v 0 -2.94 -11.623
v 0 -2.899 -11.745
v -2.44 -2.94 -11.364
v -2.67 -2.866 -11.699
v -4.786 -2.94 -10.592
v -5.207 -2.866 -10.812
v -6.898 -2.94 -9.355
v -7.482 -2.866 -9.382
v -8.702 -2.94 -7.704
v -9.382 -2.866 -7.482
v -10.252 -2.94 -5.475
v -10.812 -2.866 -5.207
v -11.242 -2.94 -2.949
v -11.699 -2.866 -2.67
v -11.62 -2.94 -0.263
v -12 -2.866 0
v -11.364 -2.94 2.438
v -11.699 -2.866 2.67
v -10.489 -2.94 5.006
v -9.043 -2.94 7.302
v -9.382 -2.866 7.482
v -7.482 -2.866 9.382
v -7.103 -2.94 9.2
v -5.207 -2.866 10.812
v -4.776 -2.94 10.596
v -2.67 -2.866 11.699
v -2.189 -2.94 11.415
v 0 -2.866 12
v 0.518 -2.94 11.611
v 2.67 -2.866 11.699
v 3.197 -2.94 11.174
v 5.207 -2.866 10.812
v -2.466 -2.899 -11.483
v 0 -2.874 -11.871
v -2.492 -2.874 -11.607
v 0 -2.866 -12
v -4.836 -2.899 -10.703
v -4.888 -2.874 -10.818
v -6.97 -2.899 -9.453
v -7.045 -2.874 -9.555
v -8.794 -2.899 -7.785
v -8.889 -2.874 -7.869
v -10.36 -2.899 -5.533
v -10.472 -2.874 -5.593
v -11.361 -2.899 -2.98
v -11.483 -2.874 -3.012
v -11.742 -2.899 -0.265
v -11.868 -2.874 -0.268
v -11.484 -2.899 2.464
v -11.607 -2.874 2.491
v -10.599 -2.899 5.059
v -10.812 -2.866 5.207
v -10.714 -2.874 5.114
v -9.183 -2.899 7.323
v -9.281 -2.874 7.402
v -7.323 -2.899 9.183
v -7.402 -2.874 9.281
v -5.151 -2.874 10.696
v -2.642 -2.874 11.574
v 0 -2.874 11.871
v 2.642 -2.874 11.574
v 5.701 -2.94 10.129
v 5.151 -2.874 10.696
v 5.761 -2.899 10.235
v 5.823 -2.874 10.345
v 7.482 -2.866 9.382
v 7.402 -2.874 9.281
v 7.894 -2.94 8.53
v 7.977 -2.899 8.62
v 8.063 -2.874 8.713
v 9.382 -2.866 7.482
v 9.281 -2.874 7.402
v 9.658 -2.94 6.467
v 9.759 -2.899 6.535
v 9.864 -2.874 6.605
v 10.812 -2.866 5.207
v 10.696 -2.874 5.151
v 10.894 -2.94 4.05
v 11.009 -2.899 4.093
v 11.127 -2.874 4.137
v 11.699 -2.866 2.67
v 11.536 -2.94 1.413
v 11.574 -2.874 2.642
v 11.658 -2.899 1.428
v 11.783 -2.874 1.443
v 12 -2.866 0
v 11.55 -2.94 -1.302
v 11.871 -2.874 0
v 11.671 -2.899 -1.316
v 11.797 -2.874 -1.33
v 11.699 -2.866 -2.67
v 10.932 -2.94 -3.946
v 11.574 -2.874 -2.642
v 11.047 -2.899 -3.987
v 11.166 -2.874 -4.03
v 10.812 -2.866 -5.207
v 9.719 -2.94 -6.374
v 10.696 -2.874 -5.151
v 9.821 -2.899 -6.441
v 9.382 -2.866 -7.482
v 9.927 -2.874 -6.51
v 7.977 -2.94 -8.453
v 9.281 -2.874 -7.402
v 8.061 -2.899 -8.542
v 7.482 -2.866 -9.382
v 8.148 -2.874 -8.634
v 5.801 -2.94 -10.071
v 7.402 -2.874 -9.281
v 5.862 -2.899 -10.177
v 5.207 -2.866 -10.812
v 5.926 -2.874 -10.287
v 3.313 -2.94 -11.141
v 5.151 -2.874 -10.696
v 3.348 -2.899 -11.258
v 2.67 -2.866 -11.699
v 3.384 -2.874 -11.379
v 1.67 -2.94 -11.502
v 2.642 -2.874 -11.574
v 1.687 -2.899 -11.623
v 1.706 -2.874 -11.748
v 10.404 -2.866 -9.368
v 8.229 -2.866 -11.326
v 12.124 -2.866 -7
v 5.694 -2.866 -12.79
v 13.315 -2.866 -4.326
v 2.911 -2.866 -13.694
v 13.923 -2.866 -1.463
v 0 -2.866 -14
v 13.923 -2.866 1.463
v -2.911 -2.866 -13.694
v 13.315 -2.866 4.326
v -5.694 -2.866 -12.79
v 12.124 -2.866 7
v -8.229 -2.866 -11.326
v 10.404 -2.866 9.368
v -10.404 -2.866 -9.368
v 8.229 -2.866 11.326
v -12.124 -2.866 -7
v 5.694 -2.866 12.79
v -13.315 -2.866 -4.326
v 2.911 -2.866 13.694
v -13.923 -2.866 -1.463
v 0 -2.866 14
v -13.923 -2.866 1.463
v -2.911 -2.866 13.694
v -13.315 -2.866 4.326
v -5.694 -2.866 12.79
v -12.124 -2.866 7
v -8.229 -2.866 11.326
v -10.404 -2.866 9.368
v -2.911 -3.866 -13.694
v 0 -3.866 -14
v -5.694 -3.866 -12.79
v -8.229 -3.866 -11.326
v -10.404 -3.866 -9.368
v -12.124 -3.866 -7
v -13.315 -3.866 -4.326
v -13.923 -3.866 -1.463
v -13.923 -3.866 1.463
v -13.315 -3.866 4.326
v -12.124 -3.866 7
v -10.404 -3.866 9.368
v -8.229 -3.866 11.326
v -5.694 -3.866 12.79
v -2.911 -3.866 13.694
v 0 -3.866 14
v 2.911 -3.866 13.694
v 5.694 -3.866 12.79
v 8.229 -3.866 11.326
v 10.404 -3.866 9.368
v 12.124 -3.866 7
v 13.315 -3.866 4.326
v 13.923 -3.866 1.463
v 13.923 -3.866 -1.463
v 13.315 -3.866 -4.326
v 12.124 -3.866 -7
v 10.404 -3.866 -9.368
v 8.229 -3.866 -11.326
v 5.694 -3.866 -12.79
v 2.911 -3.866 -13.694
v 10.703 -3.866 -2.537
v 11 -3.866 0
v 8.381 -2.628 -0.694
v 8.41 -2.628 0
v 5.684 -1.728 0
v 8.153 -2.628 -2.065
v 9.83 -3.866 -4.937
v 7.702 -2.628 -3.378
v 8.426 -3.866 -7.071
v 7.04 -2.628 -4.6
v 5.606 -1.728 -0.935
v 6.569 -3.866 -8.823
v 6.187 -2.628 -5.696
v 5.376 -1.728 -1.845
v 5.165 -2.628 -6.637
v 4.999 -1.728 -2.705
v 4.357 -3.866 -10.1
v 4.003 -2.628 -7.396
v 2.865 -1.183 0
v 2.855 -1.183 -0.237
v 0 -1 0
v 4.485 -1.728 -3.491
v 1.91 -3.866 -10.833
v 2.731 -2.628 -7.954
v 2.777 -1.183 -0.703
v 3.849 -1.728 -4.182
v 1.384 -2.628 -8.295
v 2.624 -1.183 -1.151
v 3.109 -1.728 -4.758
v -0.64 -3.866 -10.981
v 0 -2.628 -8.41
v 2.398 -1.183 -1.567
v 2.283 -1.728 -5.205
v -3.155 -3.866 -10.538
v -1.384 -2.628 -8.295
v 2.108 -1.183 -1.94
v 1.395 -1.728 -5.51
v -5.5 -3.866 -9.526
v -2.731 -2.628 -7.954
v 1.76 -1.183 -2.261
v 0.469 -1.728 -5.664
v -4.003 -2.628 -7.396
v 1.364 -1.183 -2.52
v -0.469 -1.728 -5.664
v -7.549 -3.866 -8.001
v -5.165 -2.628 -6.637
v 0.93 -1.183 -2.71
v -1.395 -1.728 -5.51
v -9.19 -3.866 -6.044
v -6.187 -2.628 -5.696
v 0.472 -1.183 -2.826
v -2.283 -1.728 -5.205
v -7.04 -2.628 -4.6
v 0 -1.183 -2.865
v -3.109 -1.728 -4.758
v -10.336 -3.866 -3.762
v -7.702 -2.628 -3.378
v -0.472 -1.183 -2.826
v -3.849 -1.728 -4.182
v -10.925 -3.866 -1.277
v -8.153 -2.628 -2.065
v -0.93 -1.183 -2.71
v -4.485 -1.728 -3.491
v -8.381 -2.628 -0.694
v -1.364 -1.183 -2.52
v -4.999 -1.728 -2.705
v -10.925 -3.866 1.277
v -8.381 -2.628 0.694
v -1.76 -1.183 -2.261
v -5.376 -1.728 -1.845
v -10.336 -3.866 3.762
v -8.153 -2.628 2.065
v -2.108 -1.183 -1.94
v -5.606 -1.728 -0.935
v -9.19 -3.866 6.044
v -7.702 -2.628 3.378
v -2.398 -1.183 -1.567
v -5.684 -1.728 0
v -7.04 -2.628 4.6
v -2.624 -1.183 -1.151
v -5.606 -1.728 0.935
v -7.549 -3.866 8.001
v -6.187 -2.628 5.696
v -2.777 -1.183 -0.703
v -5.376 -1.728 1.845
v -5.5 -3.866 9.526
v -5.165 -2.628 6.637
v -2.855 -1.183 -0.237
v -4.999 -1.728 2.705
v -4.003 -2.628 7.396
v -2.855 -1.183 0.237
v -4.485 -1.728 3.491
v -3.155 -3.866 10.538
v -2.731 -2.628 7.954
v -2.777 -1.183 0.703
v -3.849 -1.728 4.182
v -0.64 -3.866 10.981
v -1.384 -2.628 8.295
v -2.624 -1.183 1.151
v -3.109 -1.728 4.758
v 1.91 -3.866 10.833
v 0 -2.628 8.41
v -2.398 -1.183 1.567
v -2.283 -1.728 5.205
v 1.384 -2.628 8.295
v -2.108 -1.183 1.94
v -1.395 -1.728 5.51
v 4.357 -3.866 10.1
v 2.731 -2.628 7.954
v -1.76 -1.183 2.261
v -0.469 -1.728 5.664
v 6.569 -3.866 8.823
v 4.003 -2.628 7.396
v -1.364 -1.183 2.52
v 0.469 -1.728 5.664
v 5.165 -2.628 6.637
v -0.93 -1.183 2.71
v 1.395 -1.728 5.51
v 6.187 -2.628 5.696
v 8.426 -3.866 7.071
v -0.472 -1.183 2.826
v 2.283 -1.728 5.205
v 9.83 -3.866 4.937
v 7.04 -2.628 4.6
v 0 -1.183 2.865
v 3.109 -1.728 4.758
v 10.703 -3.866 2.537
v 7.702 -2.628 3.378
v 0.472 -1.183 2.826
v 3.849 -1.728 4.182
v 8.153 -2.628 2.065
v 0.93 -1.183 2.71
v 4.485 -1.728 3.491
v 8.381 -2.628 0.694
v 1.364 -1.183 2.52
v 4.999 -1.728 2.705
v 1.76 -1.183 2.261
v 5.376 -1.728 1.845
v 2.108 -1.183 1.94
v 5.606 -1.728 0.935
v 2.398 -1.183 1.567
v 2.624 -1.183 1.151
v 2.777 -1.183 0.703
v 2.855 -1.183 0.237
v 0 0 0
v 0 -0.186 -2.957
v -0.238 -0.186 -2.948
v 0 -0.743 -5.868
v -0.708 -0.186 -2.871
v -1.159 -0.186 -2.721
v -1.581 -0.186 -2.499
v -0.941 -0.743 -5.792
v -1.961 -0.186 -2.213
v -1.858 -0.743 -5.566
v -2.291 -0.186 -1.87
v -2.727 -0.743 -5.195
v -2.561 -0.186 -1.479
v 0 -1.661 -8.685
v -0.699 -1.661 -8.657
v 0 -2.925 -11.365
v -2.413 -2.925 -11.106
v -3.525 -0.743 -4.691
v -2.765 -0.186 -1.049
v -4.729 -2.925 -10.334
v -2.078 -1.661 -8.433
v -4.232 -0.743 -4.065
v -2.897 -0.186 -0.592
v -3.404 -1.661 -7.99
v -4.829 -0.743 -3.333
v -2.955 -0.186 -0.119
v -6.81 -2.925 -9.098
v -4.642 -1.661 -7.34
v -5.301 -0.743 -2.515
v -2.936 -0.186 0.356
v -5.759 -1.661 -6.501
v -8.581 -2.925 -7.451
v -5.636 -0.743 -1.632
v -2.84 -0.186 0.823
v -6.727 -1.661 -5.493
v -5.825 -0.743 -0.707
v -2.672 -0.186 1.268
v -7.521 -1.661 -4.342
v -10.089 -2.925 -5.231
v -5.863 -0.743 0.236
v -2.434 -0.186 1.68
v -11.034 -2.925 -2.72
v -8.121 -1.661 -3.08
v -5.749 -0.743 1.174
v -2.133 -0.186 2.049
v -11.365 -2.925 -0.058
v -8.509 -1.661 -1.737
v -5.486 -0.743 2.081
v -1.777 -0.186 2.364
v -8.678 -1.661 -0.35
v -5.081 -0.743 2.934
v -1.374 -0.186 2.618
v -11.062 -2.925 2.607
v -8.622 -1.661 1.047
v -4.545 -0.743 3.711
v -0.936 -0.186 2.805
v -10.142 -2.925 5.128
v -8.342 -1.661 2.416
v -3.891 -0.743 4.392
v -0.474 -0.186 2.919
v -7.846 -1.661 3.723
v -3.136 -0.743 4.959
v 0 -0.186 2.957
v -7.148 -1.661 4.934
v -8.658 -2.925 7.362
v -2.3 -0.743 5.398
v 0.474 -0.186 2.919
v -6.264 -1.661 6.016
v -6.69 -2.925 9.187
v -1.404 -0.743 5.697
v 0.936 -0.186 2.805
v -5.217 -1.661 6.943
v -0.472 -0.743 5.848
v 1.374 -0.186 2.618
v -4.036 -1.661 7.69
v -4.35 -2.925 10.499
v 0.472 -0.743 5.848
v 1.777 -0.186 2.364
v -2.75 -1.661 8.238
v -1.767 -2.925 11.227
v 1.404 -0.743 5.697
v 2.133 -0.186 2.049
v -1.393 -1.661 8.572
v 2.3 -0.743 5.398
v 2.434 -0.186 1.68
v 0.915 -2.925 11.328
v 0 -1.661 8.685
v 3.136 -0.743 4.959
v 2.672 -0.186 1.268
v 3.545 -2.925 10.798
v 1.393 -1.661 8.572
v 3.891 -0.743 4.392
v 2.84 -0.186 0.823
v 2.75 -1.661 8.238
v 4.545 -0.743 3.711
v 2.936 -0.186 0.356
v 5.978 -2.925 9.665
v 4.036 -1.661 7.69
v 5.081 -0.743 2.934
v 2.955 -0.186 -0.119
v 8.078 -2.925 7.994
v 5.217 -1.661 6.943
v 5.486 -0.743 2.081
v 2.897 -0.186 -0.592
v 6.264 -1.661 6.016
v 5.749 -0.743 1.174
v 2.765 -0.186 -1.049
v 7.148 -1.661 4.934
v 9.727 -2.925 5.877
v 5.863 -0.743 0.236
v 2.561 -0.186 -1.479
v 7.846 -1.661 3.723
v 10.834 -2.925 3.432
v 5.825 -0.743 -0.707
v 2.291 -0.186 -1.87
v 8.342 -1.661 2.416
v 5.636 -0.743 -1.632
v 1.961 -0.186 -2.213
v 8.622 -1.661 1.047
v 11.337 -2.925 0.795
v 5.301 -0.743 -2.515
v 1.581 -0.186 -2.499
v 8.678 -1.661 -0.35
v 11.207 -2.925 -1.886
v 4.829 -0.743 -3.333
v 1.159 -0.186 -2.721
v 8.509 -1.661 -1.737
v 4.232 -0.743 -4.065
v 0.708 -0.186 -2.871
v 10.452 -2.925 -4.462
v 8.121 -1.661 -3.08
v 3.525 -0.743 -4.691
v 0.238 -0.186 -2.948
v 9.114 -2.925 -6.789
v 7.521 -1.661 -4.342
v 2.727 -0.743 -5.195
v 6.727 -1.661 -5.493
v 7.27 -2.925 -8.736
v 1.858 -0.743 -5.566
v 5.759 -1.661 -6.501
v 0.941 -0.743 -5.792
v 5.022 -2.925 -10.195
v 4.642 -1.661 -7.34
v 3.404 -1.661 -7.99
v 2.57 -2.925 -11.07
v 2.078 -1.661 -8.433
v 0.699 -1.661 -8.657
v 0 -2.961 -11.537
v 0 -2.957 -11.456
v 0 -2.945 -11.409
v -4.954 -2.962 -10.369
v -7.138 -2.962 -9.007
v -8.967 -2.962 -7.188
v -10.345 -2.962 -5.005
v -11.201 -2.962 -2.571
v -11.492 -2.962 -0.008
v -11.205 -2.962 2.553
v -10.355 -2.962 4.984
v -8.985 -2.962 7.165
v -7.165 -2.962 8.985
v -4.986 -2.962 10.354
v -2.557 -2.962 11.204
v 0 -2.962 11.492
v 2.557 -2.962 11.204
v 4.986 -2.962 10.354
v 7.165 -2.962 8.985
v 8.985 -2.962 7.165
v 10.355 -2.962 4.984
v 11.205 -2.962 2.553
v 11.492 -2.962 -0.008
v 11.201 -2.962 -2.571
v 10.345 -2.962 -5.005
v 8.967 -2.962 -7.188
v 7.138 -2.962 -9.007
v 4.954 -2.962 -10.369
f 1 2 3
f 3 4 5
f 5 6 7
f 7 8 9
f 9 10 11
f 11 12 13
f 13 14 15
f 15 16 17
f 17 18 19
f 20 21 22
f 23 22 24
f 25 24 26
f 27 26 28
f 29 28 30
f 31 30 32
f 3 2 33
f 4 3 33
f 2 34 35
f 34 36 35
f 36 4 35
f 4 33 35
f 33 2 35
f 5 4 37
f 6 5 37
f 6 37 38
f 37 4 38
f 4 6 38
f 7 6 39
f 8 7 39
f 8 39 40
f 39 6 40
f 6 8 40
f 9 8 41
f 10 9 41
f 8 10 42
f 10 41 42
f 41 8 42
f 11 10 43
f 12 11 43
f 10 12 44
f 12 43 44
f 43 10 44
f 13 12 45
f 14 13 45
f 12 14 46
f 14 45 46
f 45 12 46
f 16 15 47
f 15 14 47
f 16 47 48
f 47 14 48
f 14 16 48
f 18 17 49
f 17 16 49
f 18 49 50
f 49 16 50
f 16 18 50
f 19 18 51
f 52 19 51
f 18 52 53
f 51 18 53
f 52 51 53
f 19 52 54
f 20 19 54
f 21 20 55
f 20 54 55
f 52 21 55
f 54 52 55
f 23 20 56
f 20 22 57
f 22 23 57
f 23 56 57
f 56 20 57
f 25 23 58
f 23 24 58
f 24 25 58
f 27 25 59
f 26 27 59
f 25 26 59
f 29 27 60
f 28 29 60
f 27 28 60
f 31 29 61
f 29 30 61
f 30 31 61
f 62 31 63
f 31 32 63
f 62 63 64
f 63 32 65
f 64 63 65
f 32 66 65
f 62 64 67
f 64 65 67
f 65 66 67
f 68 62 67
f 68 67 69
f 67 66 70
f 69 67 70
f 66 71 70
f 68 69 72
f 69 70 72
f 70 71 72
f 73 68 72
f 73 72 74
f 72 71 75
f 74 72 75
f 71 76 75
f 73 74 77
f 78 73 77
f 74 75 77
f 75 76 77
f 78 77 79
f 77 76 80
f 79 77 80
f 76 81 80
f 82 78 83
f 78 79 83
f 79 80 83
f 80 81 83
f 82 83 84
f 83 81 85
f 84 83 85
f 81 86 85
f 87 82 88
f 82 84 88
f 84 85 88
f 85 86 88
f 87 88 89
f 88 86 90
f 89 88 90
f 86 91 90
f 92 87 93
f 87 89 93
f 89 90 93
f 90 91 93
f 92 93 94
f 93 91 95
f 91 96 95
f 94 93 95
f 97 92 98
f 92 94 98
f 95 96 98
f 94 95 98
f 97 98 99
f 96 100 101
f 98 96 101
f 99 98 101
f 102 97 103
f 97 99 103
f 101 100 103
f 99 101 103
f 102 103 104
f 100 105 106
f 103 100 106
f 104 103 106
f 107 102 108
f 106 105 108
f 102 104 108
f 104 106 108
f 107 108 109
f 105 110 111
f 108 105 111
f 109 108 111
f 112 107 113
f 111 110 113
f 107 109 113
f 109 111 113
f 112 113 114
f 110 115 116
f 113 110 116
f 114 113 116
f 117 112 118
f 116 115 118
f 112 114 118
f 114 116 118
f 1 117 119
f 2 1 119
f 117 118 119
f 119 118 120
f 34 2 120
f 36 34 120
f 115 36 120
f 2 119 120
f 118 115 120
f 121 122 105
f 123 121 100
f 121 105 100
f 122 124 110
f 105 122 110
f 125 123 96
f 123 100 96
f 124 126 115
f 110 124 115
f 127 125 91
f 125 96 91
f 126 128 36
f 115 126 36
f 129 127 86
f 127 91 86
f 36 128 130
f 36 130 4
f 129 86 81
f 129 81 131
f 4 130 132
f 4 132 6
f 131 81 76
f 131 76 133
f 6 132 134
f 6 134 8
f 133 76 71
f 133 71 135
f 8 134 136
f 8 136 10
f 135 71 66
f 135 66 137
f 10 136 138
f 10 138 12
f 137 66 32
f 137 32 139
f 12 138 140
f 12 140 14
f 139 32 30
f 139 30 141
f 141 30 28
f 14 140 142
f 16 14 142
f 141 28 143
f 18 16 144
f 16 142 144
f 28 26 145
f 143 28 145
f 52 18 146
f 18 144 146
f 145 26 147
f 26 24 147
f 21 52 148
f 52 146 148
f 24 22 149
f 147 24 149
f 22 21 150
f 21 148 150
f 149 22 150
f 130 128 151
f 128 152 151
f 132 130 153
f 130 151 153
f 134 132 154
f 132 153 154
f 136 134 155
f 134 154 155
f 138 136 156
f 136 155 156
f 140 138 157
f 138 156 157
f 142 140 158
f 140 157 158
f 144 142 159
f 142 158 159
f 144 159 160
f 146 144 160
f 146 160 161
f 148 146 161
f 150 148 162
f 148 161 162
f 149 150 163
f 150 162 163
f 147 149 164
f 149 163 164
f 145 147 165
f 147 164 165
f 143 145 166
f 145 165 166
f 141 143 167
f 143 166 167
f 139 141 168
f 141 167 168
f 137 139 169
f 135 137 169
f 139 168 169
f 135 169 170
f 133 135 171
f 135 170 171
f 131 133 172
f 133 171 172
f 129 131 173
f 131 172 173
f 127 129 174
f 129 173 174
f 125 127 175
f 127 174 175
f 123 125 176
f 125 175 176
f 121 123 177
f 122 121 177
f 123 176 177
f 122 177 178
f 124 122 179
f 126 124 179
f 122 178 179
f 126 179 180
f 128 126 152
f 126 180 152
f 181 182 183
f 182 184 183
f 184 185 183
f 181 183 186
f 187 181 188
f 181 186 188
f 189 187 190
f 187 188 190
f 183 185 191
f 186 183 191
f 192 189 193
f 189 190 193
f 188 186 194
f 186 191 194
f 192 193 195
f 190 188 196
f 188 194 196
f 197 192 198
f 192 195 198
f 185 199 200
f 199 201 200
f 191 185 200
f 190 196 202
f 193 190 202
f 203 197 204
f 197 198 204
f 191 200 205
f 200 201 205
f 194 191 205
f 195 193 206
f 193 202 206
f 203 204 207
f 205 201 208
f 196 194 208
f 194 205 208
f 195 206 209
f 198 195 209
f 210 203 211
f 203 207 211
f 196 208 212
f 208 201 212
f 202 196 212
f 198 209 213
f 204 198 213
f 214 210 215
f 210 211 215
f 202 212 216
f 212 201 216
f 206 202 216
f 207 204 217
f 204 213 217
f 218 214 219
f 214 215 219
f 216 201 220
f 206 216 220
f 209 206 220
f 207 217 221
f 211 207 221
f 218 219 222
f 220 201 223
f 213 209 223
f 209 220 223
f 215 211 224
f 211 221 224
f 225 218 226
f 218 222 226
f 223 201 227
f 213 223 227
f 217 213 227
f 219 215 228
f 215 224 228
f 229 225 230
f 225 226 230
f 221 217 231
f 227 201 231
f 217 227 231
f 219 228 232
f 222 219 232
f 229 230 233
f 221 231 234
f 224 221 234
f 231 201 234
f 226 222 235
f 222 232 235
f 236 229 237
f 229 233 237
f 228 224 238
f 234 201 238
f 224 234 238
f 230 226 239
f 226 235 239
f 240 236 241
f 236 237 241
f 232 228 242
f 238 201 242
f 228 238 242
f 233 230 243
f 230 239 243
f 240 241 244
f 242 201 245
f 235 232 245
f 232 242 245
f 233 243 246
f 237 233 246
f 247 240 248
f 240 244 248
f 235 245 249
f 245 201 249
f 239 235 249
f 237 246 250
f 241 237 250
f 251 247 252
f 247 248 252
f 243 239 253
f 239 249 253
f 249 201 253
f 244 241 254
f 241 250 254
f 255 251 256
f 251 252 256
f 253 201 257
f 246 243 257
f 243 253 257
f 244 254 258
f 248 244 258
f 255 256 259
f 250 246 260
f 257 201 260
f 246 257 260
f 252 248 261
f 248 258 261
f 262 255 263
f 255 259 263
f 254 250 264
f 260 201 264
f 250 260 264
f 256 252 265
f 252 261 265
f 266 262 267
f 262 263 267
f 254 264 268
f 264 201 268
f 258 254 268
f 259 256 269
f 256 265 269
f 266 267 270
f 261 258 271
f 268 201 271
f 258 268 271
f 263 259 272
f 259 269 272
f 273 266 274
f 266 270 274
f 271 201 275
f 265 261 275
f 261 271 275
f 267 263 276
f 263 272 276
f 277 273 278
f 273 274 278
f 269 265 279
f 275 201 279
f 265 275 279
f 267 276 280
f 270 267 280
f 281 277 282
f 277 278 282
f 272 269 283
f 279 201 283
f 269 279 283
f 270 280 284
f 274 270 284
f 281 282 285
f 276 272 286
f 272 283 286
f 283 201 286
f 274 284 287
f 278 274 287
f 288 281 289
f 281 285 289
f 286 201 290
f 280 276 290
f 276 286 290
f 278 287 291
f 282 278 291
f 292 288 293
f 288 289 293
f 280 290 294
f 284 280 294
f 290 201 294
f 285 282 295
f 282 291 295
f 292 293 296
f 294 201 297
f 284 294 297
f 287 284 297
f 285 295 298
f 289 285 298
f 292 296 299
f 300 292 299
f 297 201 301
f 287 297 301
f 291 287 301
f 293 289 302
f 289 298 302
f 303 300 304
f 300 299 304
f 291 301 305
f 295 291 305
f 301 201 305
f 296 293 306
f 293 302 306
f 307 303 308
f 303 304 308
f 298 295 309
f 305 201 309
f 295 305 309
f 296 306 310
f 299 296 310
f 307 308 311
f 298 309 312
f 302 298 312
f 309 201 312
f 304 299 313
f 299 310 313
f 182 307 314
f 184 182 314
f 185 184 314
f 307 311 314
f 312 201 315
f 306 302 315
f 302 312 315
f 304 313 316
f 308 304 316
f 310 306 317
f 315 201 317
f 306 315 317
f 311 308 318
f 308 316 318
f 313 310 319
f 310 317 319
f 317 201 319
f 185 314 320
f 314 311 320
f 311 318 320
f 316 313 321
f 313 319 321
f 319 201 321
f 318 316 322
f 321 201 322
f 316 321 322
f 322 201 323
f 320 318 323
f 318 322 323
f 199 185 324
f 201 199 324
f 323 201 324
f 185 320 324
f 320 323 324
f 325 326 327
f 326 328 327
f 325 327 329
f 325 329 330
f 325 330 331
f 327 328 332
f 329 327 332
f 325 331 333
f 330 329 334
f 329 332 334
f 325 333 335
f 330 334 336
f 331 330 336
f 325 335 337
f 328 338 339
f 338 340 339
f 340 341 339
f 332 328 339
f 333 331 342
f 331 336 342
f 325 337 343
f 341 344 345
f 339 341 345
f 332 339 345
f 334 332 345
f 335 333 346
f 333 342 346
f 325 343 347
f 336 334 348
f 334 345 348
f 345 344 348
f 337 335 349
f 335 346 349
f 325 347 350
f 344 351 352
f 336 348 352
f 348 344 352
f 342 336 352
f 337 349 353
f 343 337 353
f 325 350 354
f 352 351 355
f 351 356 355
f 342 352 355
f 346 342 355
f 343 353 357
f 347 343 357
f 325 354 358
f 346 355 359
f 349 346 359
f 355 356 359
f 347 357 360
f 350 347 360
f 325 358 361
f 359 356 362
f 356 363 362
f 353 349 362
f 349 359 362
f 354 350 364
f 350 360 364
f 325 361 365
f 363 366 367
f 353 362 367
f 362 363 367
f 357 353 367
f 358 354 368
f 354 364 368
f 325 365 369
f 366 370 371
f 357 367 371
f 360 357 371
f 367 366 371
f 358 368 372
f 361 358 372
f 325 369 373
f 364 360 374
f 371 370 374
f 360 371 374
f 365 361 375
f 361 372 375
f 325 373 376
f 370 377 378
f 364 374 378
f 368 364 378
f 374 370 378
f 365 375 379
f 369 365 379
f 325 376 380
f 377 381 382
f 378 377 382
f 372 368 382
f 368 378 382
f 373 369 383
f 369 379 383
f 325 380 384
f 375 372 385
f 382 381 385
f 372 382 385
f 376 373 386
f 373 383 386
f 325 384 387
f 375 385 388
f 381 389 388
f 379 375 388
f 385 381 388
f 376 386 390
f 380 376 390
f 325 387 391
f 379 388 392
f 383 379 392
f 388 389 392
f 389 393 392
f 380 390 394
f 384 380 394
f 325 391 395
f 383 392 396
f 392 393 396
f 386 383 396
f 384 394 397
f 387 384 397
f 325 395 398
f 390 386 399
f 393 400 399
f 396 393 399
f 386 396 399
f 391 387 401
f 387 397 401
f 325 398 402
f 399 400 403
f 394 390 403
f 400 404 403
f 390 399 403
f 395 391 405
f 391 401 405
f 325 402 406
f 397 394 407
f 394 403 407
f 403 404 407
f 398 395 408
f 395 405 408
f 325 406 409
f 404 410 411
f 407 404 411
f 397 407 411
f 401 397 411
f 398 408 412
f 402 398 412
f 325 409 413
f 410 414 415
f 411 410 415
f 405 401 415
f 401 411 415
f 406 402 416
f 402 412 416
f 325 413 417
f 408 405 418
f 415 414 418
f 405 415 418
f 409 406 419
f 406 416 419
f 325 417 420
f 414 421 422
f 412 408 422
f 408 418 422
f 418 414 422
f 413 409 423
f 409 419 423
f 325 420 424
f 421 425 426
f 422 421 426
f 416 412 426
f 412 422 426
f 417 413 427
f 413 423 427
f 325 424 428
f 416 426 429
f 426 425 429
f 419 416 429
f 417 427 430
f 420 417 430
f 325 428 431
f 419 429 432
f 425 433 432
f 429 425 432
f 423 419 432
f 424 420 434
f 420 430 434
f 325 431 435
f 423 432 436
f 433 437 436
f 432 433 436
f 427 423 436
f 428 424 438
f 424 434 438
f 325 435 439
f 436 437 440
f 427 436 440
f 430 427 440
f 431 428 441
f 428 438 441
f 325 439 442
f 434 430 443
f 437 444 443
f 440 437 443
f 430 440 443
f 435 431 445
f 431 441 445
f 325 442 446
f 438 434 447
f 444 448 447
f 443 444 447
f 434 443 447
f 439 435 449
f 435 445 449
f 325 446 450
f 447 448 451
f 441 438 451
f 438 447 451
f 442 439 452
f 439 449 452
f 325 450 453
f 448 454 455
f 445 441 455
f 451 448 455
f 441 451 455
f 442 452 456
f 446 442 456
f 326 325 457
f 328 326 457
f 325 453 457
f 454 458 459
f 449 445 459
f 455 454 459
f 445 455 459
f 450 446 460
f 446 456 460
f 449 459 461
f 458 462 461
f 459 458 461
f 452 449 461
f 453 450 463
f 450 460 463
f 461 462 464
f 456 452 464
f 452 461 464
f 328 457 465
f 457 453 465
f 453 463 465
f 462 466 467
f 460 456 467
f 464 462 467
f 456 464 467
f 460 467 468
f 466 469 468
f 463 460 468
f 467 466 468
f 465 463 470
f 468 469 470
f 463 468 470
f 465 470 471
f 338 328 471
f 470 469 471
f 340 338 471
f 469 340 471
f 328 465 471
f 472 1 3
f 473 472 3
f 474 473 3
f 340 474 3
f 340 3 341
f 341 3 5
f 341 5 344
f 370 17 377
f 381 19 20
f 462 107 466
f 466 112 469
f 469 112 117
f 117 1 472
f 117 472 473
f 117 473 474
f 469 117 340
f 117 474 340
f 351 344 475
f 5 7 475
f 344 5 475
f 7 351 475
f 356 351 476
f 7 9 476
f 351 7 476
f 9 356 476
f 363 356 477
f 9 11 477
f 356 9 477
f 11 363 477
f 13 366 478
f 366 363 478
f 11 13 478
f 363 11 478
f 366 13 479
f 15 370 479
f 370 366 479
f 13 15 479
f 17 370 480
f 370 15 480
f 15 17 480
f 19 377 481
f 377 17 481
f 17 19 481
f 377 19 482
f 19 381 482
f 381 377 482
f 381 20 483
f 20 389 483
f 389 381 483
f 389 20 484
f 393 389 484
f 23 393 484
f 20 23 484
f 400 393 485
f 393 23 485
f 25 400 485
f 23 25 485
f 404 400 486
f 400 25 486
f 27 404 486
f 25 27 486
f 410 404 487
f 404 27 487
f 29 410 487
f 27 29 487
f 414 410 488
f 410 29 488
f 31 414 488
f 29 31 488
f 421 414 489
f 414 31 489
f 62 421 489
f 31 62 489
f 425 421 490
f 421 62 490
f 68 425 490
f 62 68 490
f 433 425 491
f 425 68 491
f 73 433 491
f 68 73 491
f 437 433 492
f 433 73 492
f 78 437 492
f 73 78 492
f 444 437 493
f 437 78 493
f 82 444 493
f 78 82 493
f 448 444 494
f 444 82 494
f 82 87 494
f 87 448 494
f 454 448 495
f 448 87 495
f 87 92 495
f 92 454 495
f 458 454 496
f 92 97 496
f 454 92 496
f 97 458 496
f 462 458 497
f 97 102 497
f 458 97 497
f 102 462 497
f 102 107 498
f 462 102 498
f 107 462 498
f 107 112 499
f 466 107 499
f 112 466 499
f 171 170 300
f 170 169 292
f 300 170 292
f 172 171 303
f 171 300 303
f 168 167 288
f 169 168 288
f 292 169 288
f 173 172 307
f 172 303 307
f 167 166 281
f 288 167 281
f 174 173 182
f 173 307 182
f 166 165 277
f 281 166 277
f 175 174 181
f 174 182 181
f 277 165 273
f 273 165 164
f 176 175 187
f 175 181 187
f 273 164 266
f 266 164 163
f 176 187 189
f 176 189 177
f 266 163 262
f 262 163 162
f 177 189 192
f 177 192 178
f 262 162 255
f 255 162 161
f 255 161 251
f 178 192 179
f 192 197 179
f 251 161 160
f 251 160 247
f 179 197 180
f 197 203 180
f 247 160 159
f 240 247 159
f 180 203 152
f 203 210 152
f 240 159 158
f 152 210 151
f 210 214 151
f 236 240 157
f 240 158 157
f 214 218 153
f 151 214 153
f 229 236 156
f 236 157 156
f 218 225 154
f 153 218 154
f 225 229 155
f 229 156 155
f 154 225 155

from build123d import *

# Parameters (mm, degrees)
FILLET_1_R = 0.3


# Read off the part's stored shape, not the designer's step: Оболочка1
with BuildPart() as part:
    # Эскиз1 → Повернуть1 (revolve)
    with BuildSketch(Plane.XY, mode=Mode.PRIVATE) as revolve_1_sk:
        with BuildLine():
            Line((-12, -2.866025404), (-14, -2.866025404))
            Line((-14, -2.866025404), (-14, -3.866025404))
            Line((-14, -3.866025404), (0, -3.866025404))
            Line((0, -3.866025404), (0, 0))
            ThreePointArc((0, 0), (-5.942432162, -0.762343379), (-11.5, -3))
            ThreePointArc((-11.5, -3), (-11.741180955, -2.900099577), (-12, -2.866025404))
        make_face()
    revolve(revolve_1_sk.sketch.rotate(Axis((0, -3.866025404, 0), (0, 1, 0)), 270), axis=Axis((0, -3.866025404, 0), (0, 1, 0)))

    # Оболочка1 outline → Оболочка1 (revolve, cut)
    with BuildSketch(Plane.XY):
        with BuildLine():
            Line((0, -3.866025415), (10.999812609, -3.866025415))
            ThreePointArc((10.999812609, -3.866025415), (5.683528374, -1.728270752), (0, -1))
            Line((0, -1), (0, -3.866025415))
        make_face()
    revolve(axis=Axis((0, 0, 0), (0, 1, 0)), mode=Mode.SUBTRACT)

    # Скругление1
    fillet_1_edges = [part.edges().sort_by_distance(p)[0] for p in [
        (0, -3, 11.5),
    ]]
    fillet(fillet_1_edges, radius=FILLET_1_R)


solid = part.part
